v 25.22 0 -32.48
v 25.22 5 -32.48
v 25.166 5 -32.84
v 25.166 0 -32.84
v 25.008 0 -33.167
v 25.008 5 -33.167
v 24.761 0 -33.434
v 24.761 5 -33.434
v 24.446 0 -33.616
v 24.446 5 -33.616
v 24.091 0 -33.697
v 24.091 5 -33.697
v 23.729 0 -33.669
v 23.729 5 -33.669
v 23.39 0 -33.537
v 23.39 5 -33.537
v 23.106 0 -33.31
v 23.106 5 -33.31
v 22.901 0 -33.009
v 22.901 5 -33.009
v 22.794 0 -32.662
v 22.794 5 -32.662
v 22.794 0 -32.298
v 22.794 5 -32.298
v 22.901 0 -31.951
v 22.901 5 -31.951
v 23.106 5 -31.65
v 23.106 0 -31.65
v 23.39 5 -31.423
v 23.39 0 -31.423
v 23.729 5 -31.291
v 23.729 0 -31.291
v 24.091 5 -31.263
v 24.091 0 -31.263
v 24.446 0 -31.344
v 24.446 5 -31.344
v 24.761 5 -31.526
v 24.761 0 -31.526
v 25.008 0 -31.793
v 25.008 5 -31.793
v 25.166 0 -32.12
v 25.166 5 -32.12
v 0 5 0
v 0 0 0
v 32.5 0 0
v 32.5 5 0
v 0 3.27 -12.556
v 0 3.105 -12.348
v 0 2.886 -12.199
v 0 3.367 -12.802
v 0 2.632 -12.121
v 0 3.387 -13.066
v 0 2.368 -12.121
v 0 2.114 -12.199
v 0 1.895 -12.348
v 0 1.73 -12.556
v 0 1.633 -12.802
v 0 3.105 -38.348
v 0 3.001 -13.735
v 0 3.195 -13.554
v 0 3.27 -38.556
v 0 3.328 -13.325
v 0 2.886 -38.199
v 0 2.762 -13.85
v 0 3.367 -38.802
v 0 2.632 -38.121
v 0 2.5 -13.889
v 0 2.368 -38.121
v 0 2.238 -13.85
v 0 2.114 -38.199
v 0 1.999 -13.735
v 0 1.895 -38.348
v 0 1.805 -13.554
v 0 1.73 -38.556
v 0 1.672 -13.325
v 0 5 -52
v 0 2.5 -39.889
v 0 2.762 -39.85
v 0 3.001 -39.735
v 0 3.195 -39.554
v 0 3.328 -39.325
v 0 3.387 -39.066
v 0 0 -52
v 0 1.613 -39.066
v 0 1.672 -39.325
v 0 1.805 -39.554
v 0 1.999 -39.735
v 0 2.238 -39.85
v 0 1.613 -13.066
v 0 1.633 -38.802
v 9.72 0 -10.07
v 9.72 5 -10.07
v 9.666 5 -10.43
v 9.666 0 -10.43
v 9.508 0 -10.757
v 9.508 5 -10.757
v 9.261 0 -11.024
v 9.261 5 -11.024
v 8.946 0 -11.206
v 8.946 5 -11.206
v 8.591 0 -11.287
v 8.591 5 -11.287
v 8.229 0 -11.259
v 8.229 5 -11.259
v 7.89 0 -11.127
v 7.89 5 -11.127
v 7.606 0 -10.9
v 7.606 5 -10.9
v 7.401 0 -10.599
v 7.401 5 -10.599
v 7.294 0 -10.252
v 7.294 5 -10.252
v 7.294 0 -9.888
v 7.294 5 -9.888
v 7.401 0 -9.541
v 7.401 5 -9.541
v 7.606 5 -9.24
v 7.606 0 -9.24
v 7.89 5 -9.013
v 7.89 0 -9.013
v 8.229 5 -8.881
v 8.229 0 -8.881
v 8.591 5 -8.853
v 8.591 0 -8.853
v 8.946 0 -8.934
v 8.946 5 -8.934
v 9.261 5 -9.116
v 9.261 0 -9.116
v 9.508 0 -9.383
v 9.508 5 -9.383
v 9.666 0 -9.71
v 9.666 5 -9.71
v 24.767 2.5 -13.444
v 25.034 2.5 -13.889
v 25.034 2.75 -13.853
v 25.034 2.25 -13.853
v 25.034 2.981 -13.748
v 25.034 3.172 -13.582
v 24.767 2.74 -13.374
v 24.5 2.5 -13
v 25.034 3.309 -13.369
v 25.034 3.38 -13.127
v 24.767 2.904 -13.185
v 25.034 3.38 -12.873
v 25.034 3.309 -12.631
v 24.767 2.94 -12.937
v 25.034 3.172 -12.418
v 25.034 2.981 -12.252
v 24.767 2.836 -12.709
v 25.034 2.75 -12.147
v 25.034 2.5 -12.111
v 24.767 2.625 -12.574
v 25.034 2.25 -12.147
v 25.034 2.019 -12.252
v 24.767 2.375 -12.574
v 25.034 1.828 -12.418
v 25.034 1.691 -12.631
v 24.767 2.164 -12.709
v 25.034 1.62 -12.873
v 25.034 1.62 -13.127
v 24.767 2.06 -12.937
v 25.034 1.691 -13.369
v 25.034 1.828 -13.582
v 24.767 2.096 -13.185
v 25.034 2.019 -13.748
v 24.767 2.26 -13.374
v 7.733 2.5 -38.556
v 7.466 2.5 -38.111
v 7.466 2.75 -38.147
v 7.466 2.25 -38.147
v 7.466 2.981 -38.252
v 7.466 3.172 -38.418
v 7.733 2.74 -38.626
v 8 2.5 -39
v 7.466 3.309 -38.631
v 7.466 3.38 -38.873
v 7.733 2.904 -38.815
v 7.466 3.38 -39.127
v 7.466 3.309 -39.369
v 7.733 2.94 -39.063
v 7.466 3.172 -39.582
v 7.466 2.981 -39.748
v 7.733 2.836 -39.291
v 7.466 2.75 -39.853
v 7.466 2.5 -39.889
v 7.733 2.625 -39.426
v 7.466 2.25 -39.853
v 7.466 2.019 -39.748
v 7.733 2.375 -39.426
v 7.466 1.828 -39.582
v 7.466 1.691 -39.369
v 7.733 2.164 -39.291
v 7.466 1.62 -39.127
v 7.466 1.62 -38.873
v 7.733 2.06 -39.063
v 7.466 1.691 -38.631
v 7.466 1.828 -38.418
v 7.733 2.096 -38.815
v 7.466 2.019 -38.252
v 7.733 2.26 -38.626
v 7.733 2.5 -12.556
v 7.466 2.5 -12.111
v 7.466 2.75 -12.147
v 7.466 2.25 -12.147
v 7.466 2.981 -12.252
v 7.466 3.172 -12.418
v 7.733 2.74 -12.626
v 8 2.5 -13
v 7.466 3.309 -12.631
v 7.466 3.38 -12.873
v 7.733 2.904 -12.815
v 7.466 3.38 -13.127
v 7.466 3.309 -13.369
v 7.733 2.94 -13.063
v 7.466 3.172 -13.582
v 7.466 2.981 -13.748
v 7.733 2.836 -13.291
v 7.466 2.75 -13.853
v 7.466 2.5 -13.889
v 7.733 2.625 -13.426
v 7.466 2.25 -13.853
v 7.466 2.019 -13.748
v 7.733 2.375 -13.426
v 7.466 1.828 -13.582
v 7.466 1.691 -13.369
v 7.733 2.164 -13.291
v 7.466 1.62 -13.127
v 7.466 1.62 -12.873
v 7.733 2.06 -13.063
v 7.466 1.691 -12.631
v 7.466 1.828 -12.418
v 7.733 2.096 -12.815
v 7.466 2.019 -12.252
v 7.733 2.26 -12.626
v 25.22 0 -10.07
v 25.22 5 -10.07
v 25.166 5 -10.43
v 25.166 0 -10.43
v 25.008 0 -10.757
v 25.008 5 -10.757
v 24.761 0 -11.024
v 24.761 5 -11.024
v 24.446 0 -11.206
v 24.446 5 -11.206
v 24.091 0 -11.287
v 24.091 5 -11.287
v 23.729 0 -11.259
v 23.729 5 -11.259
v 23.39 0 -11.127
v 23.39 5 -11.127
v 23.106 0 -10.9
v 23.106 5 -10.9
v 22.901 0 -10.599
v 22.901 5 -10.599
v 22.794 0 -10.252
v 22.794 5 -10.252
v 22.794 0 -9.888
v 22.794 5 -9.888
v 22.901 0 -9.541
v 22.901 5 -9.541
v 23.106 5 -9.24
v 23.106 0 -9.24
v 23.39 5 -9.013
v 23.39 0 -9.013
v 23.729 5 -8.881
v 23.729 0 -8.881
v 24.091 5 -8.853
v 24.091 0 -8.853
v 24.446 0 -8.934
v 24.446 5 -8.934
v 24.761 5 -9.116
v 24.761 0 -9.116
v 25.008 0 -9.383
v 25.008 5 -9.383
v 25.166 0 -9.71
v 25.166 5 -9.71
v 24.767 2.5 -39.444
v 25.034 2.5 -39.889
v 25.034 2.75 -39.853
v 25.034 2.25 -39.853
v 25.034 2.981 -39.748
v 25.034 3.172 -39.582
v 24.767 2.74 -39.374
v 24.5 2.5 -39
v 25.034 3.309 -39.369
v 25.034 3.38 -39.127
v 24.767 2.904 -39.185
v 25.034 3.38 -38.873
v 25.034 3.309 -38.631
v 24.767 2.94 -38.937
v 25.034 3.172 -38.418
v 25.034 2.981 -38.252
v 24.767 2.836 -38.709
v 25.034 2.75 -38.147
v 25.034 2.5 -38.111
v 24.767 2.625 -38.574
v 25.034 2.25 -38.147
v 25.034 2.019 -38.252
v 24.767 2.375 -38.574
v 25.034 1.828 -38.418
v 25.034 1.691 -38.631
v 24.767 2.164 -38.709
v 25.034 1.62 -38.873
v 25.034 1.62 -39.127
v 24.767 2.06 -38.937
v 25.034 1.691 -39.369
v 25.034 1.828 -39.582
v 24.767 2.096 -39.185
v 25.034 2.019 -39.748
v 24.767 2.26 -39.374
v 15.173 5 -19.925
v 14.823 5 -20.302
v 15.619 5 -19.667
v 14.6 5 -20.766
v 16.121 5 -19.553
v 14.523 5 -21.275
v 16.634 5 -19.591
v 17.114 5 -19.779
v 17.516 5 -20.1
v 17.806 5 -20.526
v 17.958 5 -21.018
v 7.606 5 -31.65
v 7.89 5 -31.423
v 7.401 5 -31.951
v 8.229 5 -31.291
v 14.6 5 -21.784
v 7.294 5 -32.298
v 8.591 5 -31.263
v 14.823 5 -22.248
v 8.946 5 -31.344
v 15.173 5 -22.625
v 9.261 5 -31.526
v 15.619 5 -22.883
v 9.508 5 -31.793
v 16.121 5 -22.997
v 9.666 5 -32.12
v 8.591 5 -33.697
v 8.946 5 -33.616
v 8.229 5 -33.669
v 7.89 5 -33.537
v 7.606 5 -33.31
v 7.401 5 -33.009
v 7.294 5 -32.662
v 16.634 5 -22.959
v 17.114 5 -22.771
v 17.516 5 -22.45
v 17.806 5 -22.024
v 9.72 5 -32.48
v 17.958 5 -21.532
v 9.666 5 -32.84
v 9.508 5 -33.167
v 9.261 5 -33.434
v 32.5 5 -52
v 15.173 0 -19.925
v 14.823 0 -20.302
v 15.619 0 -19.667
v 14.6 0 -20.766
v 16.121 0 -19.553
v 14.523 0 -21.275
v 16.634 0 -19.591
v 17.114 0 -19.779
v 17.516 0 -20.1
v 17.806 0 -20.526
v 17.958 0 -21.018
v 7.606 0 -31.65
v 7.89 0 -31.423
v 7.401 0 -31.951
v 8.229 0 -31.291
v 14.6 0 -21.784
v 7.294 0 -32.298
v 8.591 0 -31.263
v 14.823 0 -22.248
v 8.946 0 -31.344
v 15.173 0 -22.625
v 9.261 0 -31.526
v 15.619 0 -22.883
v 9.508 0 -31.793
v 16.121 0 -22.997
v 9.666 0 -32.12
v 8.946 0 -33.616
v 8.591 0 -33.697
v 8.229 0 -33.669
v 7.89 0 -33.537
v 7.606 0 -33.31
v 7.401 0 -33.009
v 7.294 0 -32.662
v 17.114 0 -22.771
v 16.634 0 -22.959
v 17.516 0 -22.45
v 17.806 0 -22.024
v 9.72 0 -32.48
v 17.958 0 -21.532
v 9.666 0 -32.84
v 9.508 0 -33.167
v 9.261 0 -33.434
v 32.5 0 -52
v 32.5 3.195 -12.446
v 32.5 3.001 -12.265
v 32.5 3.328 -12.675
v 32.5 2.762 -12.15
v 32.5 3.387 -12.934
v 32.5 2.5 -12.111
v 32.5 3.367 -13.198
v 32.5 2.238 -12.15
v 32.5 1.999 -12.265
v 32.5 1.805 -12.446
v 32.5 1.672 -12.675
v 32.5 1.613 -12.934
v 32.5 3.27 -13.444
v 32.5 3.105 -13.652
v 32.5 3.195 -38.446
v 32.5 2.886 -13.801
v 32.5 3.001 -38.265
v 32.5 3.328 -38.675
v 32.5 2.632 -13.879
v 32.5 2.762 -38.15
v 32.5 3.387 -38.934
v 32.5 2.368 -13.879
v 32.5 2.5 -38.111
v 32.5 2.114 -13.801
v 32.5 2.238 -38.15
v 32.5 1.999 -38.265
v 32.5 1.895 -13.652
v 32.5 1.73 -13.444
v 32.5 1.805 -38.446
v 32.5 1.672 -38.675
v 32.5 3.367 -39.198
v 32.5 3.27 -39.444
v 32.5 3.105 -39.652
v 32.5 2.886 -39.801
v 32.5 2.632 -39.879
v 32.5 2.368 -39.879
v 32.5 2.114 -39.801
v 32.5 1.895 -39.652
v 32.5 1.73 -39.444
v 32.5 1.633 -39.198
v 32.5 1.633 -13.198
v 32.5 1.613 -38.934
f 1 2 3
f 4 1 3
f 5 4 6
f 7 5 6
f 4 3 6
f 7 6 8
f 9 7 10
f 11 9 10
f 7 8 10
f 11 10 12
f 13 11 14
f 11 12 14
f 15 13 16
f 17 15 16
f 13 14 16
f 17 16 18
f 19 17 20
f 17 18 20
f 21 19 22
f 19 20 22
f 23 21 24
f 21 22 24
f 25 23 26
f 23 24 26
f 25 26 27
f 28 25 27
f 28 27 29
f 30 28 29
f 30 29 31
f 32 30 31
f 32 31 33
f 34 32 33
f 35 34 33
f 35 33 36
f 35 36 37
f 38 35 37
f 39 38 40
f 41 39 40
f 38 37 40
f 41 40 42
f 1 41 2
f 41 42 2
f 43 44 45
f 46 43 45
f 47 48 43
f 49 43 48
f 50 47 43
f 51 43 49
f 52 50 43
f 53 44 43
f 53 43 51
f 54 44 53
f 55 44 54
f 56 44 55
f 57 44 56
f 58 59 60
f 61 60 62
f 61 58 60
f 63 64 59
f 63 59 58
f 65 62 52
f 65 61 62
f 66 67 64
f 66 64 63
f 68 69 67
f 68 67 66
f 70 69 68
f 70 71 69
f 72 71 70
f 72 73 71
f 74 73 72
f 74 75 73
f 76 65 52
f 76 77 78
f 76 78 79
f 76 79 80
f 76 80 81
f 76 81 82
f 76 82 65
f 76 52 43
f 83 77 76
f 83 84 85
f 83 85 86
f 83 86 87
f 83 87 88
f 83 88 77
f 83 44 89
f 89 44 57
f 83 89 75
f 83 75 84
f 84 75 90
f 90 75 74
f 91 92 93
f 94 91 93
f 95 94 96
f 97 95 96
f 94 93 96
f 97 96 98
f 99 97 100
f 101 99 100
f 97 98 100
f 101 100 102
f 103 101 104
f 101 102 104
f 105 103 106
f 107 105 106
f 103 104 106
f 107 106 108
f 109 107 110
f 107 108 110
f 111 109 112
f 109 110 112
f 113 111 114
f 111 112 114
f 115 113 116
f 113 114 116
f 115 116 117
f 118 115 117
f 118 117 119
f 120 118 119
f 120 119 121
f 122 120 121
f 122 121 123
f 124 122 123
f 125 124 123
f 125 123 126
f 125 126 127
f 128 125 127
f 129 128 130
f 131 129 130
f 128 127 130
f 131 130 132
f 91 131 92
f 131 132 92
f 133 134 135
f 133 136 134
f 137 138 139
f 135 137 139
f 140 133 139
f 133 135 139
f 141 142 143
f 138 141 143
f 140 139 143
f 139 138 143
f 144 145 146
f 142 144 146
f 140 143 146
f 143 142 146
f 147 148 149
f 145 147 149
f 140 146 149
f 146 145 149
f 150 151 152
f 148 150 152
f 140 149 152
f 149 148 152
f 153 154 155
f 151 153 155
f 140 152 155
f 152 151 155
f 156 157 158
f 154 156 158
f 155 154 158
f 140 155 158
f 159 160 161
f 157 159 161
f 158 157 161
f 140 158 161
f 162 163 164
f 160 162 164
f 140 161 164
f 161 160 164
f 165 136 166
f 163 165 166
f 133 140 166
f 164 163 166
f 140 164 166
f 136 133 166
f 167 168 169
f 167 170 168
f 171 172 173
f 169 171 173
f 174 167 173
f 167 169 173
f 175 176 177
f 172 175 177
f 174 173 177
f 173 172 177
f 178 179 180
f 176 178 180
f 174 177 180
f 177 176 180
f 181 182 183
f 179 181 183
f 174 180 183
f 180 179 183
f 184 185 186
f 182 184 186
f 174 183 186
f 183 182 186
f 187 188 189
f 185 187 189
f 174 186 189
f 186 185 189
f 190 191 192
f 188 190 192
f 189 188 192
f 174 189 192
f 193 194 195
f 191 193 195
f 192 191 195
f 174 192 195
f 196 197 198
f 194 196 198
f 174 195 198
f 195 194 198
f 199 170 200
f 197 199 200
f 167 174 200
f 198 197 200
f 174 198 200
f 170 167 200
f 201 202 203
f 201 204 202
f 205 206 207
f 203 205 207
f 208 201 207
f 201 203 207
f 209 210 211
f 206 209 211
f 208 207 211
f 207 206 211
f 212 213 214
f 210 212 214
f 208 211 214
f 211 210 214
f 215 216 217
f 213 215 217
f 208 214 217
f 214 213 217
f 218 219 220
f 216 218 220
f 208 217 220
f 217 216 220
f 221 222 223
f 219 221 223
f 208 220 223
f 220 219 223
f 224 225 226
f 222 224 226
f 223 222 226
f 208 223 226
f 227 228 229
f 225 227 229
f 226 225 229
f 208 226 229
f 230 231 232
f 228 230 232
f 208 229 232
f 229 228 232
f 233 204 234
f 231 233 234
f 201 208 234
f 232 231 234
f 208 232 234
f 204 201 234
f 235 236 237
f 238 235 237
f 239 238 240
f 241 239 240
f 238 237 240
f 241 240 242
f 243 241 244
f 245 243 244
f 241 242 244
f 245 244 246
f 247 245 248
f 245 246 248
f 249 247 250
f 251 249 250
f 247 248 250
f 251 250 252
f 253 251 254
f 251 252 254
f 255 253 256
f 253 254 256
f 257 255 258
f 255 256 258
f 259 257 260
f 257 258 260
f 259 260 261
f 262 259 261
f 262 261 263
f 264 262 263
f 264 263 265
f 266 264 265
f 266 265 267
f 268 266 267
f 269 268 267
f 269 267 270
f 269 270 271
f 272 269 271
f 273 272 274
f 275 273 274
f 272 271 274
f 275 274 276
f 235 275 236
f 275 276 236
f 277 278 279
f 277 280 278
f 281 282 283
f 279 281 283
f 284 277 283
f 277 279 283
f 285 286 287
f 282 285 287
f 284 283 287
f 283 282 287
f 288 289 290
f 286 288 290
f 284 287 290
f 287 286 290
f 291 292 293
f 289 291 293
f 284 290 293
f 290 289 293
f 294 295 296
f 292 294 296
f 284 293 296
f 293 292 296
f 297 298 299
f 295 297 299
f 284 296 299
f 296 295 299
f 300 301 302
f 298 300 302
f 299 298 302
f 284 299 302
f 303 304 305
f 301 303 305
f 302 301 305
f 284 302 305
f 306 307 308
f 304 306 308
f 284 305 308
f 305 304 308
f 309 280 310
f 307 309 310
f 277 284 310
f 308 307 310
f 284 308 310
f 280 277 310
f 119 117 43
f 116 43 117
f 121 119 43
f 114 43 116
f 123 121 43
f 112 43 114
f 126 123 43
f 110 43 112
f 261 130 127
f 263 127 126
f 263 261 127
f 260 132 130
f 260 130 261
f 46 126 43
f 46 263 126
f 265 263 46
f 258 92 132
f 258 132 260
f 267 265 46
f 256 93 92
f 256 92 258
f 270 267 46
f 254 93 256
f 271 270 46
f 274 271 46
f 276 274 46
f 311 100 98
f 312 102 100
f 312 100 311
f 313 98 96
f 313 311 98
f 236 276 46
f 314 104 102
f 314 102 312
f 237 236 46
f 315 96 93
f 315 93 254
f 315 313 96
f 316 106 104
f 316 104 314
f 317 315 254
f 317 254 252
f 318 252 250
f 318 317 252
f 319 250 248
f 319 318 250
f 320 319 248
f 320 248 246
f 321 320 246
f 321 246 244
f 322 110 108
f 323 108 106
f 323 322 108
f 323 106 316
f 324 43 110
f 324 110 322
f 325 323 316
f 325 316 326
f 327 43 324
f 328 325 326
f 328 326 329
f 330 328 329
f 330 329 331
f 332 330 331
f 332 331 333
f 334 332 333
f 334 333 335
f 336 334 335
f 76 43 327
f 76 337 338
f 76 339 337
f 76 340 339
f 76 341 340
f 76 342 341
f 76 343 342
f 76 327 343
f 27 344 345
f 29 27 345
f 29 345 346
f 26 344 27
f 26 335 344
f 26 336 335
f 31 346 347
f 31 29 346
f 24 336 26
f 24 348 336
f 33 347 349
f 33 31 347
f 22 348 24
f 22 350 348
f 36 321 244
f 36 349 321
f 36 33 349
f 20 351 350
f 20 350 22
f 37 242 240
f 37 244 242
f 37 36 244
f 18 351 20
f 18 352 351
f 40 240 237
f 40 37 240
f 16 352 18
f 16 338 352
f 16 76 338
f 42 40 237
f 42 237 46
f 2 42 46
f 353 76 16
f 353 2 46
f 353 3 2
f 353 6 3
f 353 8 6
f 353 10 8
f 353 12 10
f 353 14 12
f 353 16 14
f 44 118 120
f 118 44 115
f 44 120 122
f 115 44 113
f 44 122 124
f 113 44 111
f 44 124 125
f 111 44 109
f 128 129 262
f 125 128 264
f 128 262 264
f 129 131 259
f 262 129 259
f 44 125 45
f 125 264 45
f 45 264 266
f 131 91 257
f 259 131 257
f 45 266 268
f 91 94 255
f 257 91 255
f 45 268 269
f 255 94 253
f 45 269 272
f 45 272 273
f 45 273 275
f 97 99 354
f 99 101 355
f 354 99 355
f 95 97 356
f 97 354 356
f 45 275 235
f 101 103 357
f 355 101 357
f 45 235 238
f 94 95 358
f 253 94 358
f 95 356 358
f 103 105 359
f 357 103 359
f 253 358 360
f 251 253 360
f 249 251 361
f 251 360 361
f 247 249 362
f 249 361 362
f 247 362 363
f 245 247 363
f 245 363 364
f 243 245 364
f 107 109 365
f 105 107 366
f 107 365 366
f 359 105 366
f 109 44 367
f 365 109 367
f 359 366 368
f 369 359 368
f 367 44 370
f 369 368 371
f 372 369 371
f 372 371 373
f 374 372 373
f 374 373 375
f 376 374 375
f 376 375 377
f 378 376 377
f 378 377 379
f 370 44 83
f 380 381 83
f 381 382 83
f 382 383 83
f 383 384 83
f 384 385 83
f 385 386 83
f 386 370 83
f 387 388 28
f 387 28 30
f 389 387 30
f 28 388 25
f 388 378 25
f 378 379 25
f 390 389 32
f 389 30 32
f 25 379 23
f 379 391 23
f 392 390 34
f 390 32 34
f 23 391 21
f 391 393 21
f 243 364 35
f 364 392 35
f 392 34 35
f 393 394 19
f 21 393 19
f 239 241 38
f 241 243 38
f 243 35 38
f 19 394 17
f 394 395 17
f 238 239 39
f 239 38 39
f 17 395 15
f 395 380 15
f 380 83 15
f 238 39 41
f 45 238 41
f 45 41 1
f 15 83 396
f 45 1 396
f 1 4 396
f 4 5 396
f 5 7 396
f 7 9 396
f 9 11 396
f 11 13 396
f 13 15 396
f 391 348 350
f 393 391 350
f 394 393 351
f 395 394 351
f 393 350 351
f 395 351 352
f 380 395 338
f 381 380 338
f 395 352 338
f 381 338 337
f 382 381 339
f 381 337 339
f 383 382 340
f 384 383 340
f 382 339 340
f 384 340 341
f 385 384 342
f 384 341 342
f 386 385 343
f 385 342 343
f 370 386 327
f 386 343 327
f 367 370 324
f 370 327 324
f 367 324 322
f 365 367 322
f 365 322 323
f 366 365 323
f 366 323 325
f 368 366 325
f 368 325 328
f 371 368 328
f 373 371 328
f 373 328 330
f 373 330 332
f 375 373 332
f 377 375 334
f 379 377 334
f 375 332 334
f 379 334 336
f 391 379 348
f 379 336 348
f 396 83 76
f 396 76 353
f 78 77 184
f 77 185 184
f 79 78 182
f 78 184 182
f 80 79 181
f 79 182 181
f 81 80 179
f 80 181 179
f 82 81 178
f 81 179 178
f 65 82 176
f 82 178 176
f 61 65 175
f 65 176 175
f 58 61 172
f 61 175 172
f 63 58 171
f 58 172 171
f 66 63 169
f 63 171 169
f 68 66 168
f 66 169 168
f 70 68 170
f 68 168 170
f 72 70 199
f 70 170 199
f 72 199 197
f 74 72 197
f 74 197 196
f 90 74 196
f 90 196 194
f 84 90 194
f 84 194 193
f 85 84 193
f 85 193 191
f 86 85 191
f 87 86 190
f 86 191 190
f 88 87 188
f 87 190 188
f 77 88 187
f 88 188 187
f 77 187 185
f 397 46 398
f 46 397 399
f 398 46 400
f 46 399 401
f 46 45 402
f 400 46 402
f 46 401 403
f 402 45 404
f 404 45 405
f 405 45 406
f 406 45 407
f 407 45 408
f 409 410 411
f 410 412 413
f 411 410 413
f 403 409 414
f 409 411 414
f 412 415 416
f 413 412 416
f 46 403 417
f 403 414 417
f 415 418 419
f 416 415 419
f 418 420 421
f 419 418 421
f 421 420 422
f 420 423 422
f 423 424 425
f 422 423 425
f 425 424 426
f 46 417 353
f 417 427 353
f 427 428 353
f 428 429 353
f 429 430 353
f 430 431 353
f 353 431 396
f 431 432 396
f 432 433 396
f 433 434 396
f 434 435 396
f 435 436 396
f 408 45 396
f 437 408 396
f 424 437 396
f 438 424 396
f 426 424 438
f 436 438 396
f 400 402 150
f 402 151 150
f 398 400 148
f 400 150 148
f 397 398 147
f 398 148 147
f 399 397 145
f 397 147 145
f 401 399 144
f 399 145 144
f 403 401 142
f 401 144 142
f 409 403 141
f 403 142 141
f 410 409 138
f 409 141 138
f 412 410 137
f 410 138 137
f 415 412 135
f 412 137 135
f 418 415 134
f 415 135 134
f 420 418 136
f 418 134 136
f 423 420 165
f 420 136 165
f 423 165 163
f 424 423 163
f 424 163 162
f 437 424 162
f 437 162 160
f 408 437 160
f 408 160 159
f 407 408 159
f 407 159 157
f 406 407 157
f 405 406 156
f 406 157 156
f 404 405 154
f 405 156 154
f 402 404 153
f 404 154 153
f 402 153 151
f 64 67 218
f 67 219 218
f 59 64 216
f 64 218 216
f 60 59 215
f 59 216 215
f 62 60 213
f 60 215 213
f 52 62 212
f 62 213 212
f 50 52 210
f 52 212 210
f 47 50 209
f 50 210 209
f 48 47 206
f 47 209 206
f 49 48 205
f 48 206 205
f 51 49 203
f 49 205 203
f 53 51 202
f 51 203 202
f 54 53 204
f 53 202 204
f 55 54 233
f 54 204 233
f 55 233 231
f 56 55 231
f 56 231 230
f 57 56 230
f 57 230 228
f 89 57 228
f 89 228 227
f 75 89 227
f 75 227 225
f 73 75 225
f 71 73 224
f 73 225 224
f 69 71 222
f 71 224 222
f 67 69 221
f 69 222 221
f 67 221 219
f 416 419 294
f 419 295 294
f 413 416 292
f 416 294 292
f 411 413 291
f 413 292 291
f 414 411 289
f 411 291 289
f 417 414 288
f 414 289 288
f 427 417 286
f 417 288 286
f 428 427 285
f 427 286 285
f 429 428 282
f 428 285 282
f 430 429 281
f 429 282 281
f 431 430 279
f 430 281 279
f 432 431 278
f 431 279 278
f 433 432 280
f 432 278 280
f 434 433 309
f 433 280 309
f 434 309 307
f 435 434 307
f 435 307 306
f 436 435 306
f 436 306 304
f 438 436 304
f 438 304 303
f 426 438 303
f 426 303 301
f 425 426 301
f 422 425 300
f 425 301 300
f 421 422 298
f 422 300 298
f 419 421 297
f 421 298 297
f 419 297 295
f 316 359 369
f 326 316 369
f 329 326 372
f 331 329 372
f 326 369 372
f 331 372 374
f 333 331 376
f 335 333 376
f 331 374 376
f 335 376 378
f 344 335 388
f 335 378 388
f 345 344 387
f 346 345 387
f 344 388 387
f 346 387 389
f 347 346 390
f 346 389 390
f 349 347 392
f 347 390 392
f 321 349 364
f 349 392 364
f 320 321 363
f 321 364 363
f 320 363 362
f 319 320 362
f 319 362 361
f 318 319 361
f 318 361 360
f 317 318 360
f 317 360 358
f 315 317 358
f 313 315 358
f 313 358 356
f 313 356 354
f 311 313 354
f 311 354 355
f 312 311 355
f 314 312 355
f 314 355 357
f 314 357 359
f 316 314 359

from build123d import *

# Parameters (mm, degrees)
SKETCH1_W                 = 32.5
SKETCH1_H                 = 52
BOSS_EXTRUDE1_DEPTH       = 5
F_2_56_TAPPED_HOLE1_D     = 1.778
F_2_56_TAPPED_HOLE1_DEPTH = 7.46583491
F_2_56_TAPPED_HOLE1_TIP   = 0.53416509
F_2_56_TAPPED_HOLE2_D     = 1.778
F_2_56_TAPPED_HOLE2_DEPTH = 7.46583491
F_2_56_TAPPED_HOLE2_TIP   = 0.53416509
F_8_32_TAPPED_HOLE1_D     = 3.4544
F_8_32_TAPPED_HOLE1_DEPTH = 9.672193539
F_8_32_TAPPED_HOLE1_TIP   = 1.037806461
SKETCH16_R                = 1.22
CUT_EXTRUDE4_DEPTH        = 5


with BuildPart() as part:
    # Sketch1 → Boss-Extrude1 (new body)
    with BuildSketch(Plane(origin=(0, 0, 0), x_dir=(1, 0, 0), z_dir=(0, 1, 0))):
        with Locations((16.25, 26)):
            Rectangle(SKETCH1_W, SKETCH1_H)
    extrude(amount=BOSS_EXTRUDE1_DEPTH)

    # #2-56 Tapped Hole1
    with Locations(Plane.ZY):
        with Locations((-39, 2.5), (-13, 2.5)):
            Hole(F_2_56_TAPPED_HOLE1_D / 2, depth=F_2_56_TAPPED_HOLE1_DEPTH)
            with Locations((0, 0, -(F_2_56_TAPPED_HOLE1_DEPTH + F_2_56_TAPPED_HOLE1_TIP / 2))):  # 118° drill point
                Cone(0, F_2_56_TAPPED_HOLE1_D / 2, F_2_56_TAPPED_HOLE1_TIP, mode=Mode.SUBTRACT)

    # #2-56 Tapped Hole2
    with Locations(Plane(origin=(32.5, 0, 0), x_dir=(0, 0, -1), z_dir=(1, 0, 0))):
        with Locations((13, 2.5), (39, 2.5)):
            Hole(F_2_56_TAPPED_HOLE2_D / 2, depth=F_2_56_TAPPED_HOLE2_DEPTH)
            with Locations((0, 0, -(F_2_56_TAPPED_HOLE2_DEPTH + F_2_56_TAPPED_HOLE2_TIP / 2))):  # 118° drill point
                Cone(0, F_2_56_TAPPED_HOLE2_D / 2, F_2_56_TAPPED_HOLE2_TIP, mode=Mode.SUBTRACT)

    # #8-32 Tapped Hole1
    with Locations(Plane(origin=(0, 5, 0), x_dir=(1, 0, 0), z_dir=(0, 1, 0))):
        with Locations((16.25, 21.275)):
            Hole(F_8_32_TAPPED_HOLE1_D / 2, depth=F_8_32_TAPPED_HOLE1_DEPTH)
            with Locations((0, 0, -(F_8_32_TAPPED_HOLE1_DEPTH + F_8_32_TAPPED_HOLE1_TIP / 2))):  # 118° drill point
                Cone(0, F_8_32_TAPPED_HOLE1_D / 2, F_8_32_TAPPED_HOLE1_TIP, mode=Mode.SUBTRACT)

    # Sketch16 → Cut-Extrude4 (cut)
    with BuildSketch(Plane(origin=(0, 5, 0), x_dir=(1, 0, 0), z_dir=(0, 1, 0))):
        with Locations((8.5, 32.48)):
            Circle(SKETCH16_R)
        with Locations((24, 32.48)):
            Circle(SKETCH16_R)
        with Locations((8.5, 10.07)):
            Circle(SKETCH16_R)
        with Locations((24, 10.07)):
            Circle(SKETCH16_R)
    extrude(amount=-CUT_EXTRUDE4_DEPTH, mode=Mode.SUBTRACT)


solid = part.part
